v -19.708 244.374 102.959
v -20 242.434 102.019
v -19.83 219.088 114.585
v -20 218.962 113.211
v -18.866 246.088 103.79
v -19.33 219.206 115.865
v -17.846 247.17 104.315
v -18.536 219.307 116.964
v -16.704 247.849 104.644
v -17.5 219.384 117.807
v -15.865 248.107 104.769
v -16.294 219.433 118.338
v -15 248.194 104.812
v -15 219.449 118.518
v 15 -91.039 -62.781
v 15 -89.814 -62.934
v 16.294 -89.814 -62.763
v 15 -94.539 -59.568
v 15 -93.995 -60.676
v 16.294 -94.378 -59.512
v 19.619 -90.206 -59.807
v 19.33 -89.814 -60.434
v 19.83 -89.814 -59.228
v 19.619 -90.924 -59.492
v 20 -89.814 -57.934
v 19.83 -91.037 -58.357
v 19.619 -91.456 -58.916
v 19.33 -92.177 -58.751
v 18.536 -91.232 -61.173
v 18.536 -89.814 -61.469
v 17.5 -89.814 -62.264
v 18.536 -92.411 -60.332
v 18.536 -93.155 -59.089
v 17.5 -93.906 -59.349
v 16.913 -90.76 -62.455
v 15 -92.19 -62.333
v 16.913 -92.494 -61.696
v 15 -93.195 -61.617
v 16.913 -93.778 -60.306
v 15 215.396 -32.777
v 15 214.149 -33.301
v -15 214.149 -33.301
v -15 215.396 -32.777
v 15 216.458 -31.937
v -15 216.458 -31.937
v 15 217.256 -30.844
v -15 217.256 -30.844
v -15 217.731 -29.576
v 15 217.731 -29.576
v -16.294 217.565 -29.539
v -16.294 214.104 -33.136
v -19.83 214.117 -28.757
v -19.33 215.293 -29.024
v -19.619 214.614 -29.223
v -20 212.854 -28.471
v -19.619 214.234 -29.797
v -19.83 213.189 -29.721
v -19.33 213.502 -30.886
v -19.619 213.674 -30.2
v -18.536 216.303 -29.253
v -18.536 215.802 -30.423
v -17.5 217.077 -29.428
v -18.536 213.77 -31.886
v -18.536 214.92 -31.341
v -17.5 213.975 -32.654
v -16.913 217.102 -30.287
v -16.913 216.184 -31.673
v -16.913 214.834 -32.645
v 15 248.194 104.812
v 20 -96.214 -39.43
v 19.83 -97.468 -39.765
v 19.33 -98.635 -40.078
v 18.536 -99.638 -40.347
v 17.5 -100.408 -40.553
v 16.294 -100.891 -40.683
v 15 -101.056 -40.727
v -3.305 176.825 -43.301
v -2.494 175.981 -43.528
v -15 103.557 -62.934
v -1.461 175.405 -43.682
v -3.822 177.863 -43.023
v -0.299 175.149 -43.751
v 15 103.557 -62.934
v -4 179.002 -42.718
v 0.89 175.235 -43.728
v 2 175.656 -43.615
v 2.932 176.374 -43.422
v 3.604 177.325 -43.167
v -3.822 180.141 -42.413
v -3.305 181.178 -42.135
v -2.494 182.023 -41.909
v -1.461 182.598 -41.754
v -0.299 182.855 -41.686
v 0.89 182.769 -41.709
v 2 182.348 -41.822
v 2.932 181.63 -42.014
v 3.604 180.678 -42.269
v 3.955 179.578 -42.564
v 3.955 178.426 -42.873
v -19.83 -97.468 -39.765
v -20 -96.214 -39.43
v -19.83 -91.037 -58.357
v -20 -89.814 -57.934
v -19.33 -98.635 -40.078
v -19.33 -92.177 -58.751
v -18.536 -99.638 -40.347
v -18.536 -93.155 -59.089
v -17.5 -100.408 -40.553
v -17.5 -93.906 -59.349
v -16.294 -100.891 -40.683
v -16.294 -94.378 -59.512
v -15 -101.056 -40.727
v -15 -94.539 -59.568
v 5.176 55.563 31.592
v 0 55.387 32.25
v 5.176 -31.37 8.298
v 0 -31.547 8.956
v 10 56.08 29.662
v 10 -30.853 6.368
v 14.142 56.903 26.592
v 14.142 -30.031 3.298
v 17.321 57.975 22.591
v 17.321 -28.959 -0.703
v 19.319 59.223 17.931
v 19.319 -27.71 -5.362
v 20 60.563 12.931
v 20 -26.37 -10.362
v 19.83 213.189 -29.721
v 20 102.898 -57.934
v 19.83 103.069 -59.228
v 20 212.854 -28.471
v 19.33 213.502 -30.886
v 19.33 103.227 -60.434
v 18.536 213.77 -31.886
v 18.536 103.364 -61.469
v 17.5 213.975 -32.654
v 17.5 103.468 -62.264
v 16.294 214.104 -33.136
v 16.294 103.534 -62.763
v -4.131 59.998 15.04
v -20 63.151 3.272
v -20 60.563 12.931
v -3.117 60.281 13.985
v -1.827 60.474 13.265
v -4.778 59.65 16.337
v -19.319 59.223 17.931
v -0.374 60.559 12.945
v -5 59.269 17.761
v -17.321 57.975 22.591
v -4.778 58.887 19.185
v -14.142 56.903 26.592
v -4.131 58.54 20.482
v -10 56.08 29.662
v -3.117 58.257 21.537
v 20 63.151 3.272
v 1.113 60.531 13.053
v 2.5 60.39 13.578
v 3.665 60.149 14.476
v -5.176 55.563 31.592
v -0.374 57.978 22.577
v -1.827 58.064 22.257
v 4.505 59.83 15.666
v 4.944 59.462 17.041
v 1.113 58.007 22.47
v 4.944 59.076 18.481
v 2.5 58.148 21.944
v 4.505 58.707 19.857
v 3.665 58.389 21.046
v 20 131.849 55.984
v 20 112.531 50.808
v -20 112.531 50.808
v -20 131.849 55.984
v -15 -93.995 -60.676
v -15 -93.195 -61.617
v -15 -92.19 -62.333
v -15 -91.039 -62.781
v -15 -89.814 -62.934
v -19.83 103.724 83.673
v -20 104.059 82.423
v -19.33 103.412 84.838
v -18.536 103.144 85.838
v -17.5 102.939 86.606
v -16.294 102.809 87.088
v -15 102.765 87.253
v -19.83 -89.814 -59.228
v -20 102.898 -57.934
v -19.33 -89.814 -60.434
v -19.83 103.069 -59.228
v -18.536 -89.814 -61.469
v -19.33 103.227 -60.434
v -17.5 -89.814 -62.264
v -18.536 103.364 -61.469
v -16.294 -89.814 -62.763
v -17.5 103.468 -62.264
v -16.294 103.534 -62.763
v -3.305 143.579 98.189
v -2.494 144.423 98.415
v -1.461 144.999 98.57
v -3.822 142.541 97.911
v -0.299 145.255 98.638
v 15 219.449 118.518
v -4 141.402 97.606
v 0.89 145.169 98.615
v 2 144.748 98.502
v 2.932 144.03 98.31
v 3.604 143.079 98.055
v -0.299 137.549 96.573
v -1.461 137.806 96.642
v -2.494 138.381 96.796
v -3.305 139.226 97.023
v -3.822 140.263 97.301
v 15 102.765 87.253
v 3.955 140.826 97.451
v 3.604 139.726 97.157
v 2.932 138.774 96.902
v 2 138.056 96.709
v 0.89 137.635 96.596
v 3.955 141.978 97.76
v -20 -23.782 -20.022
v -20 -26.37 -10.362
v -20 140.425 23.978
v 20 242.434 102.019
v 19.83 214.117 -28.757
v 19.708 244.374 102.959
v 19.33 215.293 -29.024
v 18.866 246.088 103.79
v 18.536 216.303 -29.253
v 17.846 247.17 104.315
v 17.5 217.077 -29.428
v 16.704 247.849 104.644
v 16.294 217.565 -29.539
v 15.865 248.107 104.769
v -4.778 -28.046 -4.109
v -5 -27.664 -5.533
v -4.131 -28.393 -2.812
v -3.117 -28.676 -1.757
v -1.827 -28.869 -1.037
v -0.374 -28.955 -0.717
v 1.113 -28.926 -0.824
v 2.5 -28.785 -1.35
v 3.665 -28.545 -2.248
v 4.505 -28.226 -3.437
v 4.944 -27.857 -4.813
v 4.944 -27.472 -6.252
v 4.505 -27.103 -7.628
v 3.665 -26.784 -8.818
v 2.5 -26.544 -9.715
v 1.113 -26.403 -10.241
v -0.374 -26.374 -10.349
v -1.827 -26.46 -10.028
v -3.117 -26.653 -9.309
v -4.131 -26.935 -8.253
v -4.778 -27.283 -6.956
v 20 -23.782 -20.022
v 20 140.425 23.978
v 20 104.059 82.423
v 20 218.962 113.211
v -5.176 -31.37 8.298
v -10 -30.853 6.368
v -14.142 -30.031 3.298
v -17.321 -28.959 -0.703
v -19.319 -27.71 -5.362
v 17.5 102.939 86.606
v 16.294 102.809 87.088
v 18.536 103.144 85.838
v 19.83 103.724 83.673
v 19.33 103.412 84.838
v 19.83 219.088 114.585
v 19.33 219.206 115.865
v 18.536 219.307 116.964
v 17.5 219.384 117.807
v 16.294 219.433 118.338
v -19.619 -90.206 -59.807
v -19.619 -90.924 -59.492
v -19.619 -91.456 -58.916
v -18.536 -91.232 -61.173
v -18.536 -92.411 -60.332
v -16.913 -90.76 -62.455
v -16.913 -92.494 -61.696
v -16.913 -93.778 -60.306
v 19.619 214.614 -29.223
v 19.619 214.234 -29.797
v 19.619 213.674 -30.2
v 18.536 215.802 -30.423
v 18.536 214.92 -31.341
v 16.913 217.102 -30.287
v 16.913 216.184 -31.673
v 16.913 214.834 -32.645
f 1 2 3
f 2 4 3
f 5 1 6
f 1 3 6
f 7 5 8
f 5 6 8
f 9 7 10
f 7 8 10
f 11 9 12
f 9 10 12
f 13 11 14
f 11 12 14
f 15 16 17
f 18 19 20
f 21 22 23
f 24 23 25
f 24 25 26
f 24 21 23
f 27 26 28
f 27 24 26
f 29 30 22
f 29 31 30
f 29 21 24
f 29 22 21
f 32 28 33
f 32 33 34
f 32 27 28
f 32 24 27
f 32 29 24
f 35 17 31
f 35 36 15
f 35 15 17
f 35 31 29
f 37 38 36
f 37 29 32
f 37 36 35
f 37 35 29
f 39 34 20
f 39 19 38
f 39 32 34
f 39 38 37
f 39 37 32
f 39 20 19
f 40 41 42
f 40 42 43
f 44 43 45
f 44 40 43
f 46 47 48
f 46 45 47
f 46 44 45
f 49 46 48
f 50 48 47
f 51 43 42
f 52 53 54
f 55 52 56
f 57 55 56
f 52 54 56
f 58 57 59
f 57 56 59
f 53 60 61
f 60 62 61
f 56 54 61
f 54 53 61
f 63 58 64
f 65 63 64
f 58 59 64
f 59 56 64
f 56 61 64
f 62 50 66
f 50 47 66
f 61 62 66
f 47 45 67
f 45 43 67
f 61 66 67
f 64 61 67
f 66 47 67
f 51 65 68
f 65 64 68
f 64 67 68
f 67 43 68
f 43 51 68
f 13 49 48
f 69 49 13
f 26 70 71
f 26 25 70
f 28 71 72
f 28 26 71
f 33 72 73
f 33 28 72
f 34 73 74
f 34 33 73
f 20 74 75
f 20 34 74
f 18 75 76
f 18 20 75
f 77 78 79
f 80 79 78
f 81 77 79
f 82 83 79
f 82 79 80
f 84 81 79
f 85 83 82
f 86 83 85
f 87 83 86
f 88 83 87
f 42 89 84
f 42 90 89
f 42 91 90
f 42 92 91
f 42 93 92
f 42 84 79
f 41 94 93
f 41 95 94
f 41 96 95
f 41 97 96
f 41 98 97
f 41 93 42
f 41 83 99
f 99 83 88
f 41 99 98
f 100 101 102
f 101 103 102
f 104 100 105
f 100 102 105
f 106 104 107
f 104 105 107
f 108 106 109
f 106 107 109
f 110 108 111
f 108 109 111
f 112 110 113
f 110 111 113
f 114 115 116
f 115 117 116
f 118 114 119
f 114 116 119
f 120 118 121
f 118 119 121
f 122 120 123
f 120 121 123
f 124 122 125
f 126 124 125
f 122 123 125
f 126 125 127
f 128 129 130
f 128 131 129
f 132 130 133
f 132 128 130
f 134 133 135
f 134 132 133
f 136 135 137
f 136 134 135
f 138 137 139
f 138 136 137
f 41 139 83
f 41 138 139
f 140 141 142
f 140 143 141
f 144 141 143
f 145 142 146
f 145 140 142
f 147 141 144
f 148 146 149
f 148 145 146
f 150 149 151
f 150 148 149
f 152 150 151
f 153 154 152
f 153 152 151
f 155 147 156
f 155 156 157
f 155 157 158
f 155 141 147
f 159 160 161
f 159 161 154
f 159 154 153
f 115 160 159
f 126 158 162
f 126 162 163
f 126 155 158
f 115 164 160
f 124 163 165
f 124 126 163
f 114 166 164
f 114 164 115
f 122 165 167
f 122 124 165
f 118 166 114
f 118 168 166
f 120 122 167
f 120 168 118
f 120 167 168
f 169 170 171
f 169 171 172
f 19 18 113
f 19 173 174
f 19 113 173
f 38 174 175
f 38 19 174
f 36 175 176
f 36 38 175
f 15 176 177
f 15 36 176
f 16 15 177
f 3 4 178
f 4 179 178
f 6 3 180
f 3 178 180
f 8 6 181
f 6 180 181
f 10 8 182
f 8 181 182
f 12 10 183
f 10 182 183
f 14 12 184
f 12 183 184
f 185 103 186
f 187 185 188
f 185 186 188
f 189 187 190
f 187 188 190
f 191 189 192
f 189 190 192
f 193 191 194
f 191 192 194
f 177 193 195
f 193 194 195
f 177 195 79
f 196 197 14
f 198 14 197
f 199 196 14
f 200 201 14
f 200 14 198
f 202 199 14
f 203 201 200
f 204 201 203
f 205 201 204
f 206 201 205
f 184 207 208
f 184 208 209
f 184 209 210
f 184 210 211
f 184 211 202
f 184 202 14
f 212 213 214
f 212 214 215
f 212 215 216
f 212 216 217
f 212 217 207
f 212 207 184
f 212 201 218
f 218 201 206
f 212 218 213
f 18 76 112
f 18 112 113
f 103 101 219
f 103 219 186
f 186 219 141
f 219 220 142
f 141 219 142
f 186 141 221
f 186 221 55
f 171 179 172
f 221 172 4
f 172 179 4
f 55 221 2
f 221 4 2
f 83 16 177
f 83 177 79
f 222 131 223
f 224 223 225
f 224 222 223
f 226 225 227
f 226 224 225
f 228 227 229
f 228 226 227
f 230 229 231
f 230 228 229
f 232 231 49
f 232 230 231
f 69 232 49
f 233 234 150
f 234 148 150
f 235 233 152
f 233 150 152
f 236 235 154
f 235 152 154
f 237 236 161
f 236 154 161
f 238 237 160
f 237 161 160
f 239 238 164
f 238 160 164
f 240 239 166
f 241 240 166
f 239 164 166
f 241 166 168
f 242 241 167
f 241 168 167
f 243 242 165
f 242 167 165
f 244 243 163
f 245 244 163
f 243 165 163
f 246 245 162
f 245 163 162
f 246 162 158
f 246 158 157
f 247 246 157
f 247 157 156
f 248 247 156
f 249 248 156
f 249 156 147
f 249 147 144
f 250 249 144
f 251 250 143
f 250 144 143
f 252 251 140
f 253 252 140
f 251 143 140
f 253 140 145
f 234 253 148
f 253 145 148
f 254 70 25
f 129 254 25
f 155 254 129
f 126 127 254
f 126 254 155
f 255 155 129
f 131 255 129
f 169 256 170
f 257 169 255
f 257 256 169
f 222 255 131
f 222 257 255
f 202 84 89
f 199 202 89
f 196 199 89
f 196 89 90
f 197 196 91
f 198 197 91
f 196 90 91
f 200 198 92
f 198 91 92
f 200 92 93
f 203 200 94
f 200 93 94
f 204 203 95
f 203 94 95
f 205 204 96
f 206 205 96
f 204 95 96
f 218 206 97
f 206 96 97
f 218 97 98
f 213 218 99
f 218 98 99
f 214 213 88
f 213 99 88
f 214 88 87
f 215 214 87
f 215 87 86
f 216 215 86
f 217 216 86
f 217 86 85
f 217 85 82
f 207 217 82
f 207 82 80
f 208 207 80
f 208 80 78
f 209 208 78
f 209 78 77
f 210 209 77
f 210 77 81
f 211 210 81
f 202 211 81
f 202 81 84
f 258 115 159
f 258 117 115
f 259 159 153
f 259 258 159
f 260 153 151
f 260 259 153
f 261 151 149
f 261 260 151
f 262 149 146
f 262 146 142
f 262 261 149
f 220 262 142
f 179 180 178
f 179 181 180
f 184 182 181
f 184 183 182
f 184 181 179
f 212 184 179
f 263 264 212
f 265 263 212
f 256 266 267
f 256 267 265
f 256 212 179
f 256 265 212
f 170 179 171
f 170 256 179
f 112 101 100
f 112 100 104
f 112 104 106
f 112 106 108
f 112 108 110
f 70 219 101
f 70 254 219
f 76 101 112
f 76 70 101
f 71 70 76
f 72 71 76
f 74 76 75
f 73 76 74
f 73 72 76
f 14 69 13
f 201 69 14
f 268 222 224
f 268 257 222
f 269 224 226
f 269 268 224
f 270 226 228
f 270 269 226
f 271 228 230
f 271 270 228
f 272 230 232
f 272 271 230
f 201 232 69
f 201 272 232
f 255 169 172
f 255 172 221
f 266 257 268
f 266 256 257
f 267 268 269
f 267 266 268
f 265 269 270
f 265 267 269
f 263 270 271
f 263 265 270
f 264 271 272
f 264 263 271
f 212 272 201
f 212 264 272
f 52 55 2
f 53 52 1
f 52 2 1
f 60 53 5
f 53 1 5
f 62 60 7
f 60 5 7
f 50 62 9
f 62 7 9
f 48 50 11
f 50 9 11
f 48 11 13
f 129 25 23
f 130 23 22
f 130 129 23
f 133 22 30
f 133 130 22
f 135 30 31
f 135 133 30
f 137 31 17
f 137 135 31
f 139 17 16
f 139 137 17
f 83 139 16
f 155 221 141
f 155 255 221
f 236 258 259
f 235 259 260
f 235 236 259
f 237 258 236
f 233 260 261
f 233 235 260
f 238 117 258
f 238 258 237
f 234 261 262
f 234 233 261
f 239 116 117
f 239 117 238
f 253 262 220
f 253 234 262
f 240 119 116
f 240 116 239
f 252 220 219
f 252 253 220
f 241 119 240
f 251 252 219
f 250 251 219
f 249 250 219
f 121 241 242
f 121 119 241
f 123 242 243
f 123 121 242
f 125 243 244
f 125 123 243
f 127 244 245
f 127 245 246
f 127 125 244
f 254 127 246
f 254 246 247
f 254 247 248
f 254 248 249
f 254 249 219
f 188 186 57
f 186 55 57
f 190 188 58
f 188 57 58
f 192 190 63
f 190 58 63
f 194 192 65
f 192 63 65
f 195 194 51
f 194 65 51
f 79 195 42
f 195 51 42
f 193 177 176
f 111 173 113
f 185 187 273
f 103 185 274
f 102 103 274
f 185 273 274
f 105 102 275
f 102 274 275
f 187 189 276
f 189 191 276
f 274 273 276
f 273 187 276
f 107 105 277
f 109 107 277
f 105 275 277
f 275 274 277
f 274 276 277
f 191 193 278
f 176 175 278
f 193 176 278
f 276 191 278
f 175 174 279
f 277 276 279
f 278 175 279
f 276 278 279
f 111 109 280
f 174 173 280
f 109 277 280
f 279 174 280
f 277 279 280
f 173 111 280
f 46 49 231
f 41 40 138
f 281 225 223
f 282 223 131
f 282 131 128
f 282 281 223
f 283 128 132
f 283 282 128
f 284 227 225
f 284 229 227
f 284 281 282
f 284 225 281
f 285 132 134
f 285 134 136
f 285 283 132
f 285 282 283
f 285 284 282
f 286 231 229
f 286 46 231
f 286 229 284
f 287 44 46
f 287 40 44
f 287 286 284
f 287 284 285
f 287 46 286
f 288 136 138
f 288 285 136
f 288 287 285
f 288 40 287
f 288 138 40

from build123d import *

# Parameters (mm, degrees)
F1_DEPTH = 20
F3_D     = 10
F3_DEPTH = 90
F3_TIP   = 3.0043030951
F4_R     = 19.99999
F5_R     = 5
F7_D     = 8


# Not quite as in the source:
# - a fillet or chamfer is up to 0.001 mm smaller than in the source, because OpenCascade refuses the exact size


with BuildPart() as f1:
    # F0 (on Right) → F1 (new body, symmetric)
    with BuildSketch(Plane.YZ):
        Polygon((55.3865908633, 32.2499277236), (-31.5467335027, 8.9562136644), (-23.7821621496, -20.0215611243), (-101.0562282528, -40.7270847325), (-93.3750867844, -62.9337131977), (103.556553434, -62.9337131977), (217.0635979758, -32.5195922775), (248.1942623854, 104.8115119338), (219.449320977, 118.5184651202), (102.765125102, 87.253029066), (112.5305330656, 50.8080303895), (131.8490495913, 55.9844112915), (140.4252283195, 23.9776765432), (63.1511622164, 3.272152935), align=None)
    extrude(amount=F1_DEPTH, both=True)

    # F3
    with Locations(Plane(origin=(0, -27.1944496451, -7.286730821), x_dir=(1, 0, 0), z_dir=(0, -0.9659258263, -0.2588190451))):
        with Locations((0, 1.8159335255)):
            Hole(F3_D / 2, depth=F3_DEPTH)
            with Locations((0, 0, -(F3_DEPTH + F3_TIP / 2))):  # 118° drill point
                Cone(0, F3_D / 2, F3_TIP, mode=Mode.SUBTRACT)

    # F4 (radius 20 in the source; OpenCascade refuses exactly that, so slightly less here)
    f4_edges = [f1.edges().sort_by_distance(p)[0] for p in [
        (20, 11.919929, 20.603071),
        (-20, 11.919929, 20.603071),
    ]]
    fillet(f4_edges, radius=F4_R)

    # F5
    f5_edges = [f1.edges().sort_by_distance(p)[0] for p in [
        (-20, -97.215658, -51.830399),
        (20, -97.215658, -51.830399),
        (0, -93.375087, -62.933713),
        (20, 5.090733, -62.933713),
        (-20, 5.090733, -62.933713),
        (20, 160.310076, -47.726653),
        (-20, 160.310076, -47.726653),
        (0, 217.063598, -32.519592),
        (20, 232.62893, 36.14596),
        (-20, 232.62893, 36.14596),
        (-20, 233.821792, 111.664989),
        (20, 233.821792, 111.664989),
        (20, 161.107223, 102.885747),
        (-20, 161.107223, 102.885747),
    ]]
    fillet(f5_edges, radius=F5_R)

    # F7 (through all)
    with Locations(Plane(origin=(0, -14.9292991962, 55.7169031216), x_dir=(1, 0, 0), z_dir=(0, -0.2588190451, 0.9659258263))):
        with Locations((0, 161.846234043)):
            Hole(F7_D / 2)


solid = f1.part
